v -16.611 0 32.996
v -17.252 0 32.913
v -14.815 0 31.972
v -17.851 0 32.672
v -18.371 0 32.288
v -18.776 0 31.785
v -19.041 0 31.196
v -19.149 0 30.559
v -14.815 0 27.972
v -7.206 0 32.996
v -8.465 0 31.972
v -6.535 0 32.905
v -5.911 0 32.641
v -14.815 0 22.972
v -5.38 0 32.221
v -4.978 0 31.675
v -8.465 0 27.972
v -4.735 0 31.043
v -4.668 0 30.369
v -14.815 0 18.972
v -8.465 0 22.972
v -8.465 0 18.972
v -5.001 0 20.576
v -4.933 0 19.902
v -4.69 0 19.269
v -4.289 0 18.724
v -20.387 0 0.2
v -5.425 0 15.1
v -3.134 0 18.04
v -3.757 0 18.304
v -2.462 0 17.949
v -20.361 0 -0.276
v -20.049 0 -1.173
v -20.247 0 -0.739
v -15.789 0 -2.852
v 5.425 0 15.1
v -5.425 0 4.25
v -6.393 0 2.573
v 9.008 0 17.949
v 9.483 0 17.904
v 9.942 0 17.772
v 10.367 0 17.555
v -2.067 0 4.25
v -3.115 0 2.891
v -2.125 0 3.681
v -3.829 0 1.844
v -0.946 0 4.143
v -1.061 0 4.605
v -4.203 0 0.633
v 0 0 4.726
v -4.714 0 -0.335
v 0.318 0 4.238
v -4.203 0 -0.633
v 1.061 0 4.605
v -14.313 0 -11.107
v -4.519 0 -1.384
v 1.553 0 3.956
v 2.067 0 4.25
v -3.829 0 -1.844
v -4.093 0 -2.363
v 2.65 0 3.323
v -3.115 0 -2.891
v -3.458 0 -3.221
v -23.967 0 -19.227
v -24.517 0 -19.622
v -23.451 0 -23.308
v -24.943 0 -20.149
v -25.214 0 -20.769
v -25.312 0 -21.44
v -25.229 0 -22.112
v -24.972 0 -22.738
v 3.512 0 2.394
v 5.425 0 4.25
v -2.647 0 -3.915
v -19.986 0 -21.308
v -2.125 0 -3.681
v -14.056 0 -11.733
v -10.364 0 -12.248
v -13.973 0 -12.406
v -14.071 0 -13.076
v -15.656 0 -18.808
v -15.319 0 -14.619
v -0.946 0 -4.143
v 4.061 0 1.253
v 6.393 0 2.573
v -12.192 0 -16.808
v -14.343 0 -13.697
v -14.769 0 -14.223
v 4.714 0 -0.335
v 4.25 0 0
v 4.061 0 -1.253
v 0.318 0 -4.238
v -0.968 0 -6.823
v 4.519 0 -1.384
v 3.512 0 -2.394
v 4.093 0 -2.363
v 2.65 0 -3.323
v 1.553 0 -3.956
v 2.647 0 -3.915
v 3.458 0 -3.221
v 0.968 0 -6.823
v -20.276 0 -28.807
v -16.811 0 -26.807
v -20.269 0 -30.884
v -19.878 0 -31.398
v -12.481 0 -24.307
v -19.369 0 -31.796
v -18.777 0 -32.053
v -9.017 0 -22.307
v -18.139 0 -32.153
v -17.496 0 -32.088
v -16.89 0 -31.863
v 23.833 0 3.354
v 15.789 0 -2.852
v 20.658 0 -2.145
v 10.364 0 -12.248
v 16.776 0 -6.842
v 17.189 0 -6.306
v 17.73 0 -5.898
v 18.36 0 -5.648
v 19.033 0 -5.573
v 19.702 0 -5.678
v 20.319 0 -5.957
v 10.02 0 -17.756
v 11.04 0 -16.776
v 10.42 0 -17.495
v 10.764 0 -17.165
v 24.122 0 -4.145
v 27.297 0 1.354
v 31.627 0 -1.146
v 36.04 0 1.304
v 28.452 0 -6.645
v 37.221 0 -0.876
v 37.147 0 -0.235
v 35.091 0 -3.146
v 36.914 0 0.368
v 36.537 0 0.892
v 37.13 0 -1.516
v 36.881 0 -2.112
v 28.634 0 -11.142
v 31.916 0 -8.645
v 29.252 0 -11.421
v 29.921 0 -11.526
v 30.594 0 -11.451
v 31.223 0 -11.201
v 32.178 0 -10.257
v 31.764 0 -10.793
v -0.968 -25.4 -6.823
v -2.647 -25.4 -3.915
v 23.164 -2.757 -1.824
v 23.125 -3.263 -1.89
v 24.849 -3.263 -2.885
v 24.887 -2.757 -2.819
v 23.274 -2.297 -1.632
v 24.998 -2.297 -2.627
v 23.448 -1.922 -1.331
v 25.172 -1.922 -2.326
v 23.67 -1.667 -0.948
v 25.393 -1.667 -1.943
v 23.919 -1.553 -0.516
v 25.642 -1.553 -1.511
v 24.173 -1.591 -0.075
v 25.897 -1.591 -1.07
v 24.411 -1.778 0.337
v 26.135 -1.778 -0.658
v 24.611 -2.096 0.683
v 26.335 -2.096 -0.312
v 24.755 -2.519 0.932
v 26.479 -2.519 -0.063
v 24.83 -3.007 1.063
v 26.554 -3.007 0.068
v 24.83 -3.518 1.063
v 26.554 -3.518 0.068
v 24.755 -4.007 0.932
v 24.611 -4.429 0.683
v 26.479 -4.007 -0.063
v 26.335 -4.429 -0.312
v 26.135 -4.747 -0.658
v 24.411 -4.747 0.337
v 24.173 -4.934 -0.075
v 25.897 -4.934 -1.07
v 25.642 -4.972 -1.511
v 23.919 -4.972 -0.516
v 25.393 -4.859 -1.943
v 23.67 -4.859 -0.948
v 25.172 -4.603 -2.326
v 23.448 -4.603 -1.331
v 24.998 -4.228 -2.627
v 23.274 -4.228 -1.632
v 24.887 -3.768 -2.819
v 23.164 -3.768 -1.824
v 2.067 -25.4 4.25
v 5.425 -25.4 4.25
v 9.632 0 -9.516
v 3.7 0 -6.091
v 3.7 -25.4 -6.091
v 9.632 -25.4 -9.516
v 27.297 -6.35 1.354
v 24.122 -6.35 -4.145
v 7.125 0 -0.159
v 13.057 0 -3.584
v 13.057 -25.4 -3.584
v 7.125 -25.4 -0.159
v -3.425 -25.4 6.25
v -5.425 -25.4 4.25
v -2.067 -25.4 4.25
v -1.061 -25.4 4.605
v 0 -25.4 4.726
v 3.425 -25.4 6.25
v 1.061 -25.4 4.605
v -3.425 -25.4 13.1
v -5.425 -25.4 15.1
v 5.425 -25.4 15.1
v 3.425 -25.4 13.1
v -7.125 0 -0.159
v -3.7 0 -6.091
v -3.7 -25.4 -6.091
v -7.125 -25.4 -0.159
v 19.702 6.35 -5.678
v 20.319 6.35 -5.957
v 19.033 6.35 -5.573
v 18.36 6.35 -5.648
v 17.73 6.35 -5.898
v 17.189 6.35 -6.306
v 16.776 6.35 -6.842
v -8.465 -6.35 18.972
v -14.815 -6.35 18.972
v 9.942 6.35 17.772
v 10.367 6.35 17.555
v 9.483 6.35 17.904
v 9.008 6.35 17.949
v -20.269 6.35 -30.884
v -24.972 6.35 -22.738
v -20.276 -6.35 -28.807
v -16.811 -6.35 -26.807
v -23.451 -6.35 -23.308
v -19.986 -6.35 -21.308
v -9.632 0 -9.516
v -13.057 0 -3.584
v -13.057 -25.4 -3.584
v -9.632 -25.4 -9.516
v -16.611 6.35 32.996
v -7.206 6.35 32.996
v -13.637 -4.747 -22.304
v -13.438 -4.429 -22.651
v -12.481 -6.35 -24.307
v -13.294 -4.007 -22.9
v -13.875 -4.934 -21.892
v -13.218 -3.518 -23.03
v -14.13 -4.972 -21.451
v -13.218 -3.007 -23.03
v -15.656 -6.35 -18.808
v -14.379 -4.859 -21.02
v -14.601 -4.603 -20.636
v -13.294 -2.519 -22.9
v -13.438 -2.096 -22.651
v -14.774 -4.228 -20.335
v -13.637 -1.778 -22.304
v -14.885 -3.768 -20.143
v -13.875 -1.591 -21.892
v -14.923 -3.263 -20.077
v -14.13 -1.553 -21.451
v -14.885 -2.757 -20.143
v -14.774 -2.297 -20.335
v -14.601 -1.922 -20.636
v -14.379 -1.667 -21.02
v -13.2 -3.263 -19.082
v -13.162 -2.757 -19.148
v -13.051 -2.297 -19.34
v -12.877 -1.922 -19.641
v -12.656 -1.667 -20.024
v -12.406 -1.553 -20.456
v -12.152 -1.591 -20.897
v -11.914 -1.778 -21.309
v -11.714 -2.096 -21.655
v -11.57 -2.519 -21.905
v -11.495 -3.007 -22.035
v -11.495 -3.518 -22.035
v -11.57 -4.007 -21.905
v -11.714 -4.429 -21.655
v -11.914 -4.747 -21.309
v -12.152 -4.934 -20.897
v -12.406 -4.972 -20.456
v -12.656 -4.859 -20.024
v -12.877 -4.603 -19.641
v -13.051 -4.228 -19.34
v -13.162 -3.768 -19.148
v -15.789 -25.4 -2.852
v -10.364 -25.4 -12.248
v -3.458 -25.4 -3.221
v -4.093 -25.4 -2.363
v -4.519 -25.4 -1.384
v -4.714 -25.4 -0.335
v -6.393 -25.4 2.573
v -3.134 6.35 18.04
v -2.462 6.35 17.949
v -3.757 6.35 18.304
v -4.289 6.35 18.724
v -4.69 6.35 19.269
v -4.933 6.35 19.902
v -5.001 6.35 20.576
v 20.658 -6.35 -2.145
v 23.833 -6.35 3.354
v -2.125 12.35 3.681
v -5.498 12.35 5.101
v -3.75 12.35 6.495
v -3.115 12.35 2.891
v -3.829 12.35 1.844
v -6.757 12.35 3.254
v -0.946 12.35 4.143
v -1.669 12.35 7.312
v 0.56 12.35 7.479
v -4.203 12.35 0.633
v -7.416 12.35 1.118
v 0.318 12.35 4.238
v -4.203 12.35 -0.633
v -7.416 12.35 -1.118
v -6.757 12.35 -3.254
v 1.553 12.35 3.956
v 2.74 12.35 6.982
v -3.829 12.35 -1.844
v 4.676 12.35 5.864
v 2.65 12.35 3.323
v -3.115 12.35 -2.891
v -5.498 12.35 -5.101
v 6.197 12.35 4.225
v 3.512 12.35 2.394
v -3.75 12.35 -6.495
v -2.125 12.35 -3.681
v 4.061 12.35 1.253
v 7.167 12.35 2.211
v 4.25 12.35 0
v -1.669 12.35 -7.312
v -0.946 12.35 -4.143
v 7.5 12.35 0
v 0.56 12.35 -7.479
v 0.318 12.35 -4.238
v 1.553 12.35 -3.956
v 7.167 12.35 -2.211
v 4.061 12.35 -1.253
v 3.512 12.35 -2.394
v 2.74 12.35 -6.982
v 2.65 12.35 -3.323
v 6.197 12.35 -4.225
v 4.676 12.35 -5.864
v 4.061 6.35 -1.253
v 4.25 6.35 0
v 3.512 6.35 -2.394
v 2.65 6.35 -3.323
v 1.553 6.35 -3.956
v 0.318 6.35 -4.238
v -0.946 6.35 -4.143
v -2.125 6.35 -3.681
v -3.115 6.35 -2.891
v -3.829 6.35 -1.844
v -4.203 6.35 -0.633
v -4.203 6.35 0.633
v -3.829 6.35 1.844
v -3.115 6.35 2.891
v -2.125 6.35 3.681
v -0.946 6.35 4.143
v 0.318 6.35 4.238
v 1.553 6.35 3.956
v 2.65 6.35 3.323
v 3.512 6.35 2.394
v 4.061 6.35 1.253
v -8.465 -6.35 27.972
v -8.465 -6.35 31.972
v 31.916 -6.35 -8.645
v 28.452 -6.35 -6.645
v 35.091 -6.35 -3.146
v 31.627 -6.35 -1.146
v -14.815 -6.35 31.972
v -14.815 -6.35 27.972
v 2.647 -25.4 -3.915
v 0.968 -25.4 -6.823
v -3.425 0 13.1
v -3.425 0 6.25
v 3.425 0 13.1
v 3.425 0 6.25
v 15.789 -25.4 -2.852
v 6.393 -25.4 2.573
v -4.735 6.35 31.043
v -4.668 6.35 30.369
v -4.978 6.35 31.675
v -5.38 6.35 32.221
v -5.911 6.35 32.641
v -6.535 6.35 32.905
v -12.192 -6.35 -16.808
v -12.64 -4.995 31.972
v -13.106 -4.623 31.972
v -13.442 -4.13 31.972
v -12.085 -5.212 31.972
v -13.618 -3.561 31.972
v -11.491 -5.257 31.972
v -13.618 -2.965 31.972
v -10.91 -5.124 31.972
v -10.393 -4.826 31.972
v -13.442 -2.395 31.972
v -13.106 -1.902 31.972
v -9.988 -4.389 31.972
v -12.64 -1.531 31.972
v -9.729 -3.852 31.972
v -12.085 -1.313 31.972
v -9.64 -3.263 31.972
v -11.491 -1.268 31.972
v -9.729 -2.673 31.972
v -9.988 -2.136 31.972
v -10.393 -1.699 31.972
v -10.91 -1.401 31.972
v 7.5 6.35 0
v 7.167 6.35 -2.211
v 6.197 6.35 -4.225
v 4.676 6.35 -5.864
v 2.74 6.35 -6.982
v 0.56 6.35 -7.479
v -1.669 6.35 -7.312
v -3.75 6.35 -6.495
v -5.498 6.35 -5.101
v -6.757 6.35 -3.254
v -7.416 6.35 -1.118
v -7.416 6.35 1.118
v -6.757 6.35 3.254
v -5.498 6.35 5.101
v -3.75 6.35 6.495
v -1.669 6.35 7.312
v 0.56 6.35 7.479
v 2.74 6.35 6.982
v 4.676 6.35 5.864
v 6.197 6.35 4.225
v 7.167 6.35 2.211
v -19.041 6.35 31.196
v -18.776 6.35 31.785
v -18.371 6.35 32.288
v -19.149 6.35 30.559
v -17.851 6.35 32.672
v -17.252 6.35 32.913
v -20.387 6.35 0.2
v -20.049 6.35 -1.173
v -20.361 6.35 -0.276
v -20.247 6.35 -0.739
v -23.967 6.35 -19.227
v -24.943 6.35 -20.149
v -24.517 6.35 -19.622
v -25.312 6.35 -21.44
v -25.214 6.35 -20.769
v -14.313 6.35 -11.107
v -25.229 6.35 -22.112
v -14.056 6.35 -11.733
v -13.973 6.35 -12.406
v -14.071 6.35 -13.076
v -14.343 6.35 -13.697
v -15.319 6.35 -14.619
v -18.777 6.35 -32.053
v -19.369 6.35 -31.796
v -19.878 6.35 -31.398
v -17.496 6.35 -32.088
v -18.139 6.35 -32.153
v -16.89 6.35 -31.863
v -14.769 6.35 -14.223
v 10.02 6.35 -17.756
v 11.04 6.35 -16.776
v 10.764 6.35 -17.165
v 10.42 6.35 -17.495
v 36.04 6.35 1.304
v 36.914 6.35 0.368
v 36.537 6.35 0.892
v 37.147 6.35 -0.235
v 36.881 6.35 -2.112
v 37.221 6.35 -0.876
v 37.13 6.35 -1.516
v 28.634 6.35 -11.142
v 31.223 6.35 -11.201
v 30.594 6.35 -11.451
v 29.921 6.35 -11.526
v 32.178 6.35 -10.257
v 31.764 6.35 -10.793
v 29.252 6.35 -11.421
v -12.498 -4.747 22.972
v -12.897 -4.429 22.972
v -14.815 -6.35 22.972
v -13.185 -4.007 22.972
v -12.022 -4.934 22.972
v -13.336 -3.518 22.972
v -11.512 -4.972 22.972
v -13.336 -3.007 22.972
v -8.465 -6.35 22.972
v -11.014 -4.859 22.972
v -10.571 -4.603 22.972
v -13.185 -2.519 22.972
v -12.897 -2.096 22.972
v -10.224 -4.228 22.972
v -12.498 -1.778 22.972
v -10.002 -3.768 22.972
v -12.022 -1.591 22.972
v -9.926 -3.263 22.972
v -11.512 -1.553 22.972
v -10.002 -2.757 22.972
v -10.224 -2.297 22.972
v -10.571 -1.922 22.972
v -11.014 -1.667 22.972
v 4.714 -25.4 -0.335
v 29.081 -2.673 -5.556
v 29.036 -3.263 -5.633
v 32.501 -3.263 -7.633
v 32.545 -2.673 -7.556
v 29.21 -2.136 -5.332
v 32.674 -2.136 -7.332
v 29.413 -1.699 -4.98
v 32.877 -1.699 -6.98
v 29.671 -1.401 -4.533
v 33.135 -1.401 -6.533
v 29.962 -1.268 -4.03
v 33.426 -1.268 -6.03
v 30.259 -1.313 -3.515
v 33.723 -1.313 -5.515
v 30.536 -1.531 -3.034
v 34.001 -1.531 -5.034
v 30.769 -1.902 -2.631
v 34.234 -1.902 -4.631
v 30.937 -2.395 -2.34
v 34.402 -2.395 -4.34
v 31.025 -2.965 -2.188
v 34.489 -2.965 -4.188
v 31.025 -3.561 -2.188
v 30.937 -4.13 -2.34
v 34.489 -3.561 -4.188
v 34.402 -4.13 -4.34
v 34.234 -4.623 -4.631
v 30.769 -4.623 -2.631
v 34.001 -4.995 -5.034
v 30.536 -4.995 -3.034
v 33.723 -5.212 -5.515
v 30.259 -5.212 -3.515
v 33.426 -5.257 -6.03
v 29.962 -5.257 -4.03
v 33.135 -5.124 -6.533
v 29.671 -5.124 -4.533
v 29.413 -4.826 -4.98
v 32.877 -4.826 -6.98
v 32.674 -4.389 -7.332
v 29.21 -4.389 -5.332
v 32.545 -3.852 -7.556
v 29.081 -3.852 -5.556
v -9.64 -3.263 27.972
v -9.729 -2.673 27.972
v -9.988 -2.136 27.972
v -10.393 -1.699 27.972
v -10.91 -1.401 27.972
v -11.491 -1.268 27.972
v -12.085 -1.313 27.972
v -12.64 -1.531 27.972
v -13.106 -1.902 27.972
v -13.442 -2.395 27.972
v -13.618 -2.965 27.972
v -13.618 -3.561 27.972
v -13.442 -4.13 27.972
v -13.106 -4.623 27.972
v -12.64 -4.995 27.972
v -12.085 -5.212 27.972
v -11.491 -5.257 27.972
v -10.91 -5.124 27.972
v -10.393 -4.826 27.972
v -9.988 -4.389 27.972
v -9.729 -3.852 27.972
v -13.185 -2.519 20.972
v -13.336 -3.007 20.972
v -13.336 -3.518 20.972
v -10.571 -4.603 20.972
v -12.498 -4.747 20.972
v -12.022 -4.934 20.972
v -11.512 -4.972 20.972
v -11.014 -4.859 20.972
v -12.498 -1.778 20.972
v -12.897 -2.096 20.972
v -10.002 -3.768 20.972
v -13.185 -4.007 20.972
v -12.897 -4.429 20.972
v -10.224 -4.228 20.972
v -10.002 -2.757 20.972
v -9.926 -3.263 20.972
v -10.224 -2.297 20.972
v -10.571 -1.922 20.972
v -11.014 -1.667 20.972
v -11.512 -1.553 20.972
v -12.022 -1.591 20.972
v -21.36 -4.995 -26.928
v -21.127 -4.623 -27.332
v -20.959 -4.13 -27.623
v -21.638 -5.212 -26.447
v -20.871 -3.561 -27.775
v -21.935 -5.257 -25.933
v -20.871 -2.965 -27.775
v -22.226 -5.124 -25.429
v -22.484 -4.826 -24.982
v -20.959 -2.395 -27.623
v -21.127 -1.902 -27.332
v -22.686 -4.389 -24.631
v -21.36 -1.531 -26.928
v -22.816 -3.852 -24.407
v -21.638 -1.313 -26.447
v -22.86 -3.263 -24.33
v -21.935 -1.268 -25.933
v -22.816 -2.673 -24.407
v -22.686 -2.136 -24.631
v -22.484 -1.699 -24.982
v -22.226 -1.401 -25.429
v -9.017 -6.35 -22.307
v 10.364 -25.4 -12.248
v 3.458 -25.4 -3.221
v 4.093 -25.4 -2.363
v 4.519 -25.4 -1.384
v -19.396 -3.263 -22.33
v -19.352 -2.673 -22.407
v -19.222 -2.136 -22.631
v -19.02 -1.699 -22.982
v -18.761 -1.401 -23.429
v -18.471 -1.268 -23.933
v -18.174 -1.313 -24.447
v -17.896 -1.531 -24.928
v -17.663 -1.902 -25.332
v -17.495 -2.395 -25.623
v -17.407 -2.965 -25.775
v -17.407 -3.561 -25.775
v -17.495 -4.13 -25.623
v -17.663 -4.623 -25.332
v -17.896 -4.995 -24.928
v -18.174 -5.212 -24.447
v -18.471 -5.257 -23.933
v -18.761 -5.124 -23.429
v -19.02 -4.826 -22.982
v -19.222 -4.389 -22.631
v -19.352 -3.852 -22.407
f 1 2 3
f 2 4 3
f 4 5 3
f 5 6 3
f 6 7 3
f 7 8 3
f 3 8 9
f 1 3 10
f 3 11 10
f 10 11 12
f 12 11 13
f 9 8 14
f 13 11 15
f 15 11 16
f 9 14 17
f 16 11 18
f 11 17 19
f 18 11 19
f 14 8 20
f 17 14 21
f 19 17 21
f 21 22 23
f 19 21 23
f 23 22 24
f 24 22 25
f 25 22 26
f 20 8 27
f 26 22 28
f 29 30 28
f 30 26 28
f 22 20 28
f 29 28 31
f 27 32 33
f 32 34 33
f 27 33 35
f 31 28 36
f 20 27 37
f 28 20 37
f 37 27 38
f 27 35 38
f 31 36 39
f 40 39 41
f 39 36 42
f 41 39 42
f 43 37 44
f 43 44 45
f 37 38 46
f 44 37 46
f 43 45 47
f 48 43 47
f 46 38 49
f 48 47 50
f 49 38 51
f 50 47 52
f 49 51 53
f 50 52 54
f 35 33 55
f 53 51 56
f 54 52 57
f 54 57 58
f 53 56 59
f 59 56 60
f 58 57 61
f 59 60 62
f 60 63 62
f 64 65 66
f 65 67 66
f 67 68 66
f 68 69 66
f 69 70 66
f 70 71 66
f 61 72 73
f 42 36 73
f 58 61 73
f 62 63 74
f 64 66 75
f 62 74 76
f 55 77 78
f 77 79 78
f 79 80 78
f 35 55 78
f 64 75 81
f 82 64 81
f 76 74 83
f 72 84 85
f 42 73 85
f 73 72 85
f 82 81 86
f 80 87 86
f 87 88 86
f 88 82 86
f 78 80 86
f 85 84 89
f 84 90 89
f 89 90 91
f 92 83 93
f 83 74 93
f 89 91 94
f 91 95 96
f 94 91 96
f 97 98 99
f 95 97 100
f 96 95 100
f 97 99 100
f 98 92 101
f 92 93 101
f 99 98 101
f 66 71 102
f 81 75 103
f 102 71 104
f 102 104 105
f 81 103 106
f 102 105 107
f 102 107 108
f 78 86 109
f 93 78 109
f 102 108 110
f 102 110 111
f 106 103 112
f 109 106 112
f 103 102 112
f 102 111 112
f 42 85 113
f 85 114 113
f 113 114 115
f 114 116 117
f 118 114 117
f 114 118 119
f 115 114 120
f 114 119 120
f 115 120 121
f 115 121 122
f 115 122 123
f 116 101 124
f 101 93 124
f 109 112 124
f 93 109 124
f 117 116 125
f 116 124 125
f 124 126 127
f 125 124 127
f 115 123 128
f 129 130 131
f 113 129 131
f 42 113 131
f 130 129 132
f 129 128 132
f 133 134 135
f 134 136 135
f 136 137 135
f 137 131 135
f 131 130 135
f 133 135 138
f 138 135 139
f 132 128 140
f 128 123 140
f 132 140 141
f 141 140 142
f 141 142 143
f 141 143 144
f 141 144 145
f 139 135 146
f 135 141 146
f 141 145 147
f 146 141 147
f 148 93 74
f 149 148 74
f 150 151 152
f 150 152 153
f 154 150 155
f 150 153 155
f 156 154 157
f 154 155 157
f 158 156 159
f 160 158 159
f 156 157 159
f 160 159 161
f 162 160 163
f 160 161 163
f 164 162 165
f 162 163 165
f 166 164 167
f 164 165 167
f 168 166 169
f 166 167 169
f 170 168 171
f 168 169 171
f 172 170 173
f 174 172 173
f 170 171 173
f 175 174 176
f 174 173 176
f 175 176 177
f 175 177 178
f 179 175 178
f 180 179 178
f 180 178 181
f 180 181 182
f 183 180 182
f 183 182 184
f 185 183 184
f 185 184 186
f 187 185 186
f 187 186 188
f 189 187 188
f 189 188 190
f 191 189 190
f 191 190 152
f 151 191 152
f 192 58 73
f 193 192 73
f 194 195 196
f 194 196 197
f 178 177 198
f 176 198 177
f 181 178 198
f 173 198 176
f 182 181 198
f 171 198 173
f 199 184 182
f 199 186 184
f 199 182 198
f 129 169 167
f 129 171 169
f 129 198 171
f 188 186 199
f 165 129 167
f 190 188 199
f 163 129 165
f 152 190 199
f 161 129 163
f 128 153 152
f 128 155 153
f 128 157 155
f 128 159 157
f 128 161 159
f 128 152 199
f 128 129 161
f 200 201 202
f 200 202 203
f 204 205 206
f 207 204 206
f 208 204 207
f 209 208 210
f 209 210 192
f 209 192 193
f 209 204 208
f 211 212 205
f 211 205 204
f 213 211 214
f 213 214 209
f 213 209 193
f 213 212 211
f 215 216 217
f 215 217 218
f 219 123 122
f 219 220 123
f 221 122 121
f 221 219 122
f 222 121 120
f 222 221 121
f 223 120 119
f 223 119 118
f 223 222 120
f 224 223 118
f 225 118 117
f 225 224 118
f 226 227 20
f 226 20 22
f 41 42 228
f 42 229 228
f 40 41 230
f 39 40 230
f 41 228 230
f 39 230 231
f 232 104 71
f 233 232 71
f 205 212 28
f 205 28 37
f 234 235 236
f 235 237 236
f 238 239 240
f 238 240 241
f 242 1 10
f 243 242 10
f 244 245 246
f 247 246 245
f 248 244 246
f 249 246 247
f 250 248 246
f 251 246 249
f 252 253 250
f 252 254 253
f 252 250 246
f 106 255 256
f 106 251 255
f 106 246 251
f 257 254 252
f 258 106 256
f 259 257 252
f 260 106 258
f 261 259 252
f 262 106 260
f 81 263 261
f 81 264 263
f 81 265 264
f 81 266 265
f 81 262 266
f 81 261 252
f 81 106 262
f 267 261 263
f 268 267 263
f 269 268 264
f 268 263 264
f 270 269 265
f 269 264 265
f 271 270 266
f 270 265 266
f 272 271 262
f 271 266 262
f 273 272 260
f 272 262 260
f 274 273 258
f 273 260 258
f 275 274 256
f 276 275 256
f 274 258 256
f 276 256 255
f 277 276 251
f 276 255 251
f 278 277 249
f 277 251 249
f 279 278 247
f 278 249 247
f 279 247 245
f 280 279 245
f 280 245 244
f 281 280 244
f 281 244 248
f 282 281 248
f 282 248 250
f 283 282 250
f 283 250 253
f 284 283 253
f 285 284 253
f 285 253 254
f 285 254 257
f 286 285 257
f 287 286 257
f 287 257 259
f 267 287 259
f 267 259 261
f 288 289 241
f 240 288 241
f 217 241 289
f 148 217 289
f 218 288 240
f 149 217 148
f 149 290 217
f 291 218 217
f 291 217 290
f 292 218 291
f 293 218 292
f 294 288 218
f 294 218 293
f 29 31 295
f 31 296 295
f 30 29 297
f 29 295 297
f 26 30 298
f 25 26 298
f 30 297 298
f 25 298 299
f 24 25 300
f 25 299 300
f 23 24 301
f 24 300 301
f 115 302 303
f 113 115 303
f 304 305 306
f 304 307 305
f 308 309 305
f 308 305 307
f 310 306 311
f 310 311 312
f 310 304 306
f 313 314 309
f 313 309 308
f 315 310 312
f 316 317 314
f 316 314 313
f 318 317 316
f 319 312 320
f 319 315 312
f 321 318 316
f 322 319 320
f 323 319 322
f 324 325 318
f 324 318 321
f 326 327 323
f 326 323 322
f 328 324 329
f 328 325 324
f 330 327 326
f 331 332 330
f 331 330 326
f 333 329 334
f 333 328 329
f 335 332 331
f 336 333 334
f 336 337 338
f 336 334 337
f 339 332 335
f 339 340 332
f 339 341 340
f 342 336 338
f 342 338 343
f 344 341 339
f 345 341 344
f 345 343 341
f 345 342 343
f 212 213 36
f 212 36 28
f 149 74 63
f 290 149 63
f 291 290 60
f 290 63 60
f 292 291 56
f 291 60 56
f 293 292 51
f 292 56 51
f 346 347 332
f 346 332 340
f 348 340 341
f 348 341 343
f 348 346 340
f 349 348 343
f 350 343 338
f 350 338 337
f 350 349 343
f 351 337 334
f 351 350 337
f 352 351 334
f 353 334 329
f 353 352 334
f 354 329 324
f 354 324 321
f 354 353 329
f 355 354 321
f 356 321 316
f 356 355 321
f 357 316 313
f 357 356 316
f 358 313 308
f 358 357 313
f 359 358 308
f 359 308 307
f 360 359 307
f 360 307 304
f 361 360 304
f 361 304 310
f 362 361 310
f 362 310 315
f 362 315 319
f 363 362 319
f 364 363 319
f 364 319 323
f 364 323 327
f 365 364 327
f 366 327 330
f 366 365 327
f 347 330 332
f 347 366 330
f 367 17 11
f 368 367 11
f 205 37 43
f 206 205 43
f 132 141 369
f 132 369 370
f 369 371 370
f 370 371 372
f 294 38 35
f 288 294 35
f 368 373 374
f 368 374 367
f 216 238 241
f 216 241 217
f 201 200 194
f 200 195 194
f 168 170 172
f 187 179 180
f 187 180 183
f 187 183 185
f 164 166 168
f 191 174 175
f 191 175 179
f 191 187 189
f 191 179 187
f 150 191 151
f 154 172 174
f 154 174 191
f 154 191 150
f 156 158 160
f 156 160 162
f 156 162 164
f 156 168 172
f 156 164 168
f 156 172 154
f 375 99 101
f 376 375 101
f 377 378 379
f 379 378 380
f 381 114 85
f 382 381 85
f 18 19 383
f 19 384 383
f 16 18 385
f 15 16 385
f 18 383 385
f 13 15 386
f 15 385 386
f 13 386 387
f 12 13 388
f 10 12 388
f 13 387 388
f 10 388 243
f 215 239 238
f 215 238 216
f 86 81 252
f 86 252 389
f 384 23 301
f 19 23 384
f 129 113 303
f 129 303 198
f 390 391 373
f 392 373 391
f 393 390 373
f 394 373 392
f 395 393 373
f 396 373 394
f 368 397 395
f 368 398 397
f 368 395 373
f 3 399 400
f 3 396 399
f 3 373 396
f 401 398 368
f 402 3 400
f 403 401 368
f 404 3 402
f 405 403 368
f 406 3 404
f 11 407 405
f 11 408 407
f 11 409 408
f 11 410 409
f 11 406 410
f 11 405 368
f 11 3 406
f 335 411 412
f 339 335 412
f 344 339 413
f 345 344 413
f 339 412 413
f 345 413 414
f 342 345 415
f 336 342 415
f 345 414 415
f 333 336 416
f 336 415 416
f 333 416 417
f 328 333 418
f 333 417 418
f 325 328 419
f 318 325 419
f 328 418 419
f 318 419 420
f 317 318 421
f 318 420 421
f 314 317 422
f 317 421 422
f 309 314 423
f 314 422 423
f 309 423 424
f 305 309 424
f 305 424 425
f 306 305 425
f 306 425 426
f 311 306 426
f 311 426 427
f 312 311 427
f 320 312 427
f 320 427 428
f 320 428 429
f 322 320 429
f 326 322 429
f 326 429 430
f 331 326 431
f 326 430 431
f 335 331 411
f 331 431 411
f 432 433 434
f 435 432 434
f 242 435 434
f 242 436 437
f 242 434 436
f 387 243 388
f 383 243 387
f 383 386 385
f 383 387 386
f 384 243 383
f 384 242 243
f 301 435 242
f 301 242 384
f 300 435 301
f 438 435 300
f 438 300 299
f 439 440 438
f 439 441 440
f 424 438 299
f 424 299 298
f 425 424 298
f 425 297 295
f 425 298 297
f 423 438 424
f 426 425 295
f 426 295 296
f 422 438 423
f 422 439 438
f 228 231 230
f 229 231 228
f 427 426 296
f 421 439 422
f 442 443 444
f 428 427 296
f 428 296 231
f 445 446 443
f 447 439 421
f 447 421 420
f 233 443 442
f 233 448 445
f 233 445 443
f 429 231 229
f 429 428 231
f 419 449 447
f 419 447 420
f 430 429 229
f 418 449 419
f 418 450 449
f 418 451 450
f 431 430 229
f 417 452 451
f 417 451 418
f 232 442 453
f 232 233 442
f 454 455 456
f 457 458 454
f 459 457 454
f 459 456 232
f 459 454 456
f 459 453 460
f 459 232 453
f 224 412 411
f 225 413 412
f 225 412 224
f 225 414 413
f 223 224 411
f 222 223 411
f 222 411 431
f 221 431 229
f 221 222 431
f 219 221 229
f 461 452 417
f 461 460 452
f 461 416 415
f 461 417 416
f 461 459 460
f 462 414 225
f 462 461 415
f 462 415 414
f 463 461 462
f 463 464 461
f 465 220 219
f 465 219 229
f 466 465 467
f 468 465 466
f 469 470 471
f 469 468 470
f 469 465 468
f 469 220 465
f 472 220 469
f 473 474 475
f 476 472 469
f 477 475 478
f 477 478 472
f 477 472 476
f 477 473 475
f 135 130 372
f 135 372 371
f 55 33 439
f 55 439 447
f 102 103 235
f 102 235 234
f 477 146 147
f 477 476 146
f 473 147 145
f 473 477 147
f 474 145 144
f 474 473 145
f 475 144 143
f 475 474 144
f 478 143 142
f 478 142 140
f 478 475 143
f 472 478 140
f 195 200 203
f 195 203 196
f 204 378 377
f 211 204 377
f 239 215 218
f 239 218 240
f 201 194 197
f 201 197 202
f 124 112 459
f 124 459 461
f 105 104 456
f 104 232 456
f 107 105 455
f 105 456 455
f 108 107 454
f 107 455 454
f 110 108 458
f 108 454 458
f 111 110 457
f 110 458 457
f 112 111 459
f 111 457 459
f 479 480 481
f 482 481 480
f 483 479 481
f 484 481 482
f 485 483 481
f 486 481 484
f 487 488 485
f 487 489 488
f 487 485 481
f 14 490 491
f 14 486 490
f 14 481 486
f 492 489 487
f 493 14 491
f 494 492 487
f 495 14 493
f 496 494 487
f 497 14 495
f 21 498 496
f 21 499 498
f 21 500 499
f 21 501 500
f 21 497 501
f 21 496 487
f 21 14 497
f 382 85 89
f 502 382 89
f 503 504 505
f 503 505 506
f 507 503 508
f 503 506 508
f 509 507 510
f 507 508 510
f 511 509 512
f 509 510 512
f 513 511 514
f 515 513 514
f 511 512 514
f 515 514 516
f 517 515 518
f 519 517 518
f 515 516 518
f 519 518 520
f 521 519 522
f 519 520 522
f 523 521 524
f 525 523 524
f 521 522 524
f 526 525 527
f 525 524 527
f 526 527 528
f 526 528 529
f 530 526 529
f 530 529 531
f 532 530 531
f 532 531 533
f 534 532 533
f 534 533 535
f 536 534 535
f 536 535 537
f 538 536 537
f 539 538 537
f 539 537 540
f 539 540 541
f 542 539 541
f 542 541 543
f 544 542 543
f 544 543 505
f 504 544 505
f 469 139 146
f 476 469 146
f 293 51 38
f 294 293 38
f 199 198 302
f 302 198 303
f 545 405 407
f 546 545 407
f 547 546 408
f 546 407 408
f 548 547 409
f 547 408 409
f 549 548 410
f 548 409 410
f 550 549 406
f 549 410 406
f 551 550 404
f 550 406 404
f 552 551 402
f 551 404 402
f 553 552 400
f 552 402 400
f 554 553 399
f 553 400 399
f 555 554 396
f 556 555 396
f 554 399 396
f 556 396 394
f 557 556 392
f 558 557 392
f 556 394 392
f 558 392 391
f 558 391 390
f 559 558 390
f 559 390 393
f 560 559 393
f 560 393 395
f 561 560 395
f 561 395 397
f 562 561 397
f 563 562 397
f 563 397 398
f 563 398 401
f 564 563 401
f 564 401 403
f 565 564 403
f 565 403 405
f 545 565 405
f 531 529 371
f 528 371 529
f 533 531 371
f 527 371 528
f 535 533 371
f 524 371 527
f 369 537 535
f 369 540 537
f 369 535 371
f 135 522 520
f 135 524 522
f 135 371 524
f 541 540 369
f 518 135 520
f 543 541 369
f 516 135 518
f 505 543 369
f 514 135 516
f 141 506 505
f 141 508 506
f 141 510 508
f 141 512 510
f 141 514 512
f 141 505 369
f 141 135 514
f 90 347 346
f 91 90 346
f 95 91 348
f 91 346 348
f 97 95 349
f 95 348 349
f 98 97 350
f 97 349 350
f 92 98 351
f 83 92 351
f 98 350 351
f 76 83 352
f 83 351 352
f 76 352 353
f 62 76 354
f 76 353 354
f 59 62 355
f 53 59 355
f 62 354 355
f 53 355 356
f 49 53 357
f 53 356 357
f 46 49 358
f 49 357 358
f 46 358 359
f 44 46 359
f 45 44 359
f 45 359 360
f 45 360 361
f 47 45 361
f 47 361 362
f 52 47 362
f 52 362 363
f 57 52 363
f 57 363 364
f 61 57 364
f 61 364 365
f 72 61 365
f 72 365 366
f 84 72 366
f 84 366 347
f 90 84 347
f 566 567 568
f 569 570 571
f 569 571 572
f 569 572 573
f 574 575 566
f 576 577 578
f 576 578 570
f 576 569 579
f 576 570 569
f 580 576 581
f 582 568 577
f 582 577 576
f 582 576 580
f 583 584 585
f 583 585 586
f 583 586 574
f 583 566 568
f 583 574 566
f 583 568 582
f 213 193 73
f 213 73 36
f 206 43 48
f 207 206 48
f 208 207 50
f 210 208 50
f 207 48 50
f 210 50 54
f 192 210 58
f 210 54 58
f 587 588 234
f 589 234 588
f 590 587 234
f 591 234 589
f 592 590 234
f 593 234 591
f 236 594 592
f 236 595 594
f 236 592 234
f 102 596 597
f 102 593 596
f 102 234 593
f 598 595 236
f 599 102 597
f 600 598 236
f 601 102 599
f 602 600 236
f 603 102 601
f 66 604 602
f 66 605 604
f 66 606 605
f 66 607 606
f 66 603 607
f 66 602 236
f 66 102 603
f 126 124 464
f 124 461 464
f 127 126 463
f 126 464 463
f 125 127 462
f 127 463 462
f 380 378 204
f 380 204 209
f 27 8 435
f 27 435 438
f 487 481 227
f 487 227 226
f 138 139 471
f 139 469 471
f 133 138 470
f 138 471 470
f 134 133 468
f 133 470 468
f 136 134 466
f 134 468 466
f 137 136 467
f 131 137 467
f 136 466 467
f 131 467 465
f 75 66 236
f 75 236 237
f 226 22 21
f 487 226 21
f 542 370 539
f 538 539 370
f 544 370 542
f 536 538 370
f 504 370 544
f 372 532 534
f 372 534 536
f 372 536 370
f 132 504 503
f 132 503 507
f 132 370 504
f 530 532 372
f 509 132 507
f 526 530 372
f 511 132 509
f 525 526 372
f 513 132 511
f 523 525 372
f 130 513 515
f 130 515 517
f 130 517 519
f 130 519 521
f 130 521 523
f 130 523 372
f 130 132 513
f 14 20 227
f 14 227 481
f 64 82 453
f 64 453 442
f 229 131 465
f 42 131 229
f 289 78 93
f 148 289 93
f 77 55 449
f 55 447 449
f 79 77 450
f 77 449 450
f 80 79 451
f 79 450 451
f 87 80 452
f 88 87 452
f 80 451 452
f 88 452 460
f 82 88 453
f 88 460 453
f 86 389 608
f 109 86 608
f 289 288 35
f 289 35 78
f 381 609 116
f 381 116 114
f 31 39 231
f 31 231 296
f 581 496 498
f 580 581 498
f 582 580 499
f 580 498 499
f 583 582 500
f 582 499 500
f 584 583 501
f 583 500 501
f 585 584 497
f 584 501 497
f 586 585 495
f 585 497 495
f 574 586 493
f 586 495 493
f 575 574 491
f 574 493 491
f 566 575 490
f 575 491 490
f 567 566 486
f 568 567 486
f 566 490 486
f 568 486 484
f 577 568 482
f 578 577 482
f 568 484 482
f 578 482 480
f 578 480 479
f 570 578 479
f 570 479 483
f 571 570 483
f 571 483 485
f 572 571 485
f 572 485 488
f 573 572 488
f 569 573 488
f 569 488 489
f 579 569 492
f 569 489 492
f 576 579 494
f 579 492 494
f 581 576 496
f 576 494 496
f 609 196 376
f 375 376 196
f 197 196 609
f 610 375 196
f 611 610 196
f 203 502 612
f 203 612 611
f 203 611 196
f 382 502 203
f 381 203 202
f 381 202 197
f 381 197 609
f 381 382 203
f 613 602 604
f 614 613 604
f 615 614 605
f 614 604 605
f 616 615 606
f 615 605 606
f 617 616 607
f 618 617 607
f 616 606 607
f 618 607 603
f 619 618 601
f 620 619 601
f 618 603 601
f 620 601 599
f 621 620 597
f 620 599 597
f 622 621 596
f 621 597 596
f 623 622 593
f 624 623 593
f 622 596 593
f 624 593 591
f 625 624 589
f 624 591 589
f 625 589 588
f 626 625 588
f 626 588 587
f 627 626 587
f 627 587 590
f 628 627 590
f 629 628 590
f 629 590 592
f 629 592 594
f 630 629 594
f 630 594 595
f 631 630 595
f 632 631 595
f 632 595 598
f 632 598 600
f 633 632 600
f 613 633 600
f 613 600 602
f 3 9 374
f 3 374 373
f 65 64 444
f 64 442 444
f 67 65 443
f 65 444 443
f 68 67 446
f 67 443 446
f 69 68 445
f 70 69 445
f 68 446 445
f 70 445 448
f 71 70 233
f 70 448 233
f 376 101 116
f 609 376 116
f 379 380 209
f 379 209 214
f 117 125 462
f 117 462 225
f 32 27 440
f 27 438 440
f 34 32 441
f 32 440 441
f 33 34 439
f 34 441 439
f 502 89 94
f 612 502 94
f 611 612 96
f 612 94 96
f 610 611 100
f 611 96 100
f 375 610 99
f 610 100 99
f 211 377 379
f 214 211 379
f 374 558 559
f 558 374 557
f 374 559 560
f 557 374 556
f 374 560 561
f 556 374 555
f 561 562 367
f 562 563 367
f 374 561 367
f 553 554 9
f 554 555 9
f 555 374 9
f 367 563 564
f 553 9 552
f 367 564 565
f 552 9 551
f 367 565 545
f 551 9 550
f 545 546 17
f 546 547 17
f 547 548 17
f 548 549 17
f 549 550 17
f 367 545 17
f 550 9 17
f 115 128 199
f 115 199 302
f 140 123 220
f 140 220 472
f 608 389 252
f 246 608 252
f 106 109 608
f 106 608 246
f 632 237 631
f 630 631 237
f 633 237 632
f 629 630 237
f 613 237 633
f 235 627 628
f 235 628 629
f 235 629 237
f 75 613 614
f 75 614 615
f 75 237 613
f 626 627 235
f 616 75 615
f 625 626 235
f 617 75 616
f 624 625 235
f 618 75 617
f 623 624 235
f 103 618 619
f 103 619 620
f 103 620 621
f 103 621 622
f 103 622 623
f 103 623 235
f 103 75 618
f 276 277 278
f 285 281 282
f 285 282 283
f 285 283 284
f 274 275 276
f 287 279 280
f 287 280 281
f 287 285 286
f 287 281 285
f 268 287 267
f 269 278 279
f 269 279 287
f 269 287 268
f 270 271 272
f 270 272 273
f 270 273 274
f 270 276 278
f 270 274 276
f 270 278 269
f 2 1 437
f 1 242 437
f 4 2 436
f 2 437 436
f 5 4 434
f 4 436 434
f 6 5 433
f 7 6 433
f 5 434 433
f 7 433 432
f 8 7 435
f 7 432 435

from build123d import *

# Parameters (mm, degrees)
BOSS_EXTRUDE1_DEPTH = 6.35
SKETCH6_R           = 4.250000001
CUT_EXTRUDE1_DEPTH  = 7.35
SKETCH2_W           = 6.85
SKETCH2_H           = 6.85
BOSS_EXTRUDE2_DEPTH = 25.4
SKETCH7_W           = 6.35
SKETCH7_H           = 4
BOSS_EXTRUDE3_DEPTH = 6.35
SKETCH9_R           = 2
CUT_EXTRUDE2_DEPTH  = 6.540000128
CIRPATTERN1_COUNT   = 3
SKETCH10_R          = 1.7145
CUT_EXTRUDE3_DEPTH  = 2
CIRPATTERN2_COUNT   = 3
CUT_EXTRUDE4_DEPTH  = 6.35
FILLET1_R           = 2.54
SKETCH12_R          = 7.5
SKETCH12_R_2        = 4.250000001
BOSS_EXTRUDE4_DEPTH = 6


with BuildPart() as part:
    # Sketch1 → Boss-Extrude1 (new body)
    with BuildSketch(Plane(origin=(0, 0, 0), x_dir=(1, 0, 0), z_dir=(0, 1, 0))):
        Polygon((19.05, -32.995567884), (38.1, 0), (19.05, 32.995567884), (-19.05, 32.995567884), (-38.1, 0), (-19.05, -32.995567884), align=None)
    extrude(amount=BOSS_EXTRUDE1_DEPTH)

    # Sketch6 → Cut-Extrude1 (cut, through all)
    with BuildSketch(Plane(origin=(0, 6.35, 0), x_dir=(1, 0, 0), z_dir=(0, 1, 0))):
        Circle(SKETCH6_R)
    extrude(amount=-CUT_EXTRUDE1_DEPTH, mode=Mode.SUBTRACT)

    # Sketch2 → Boss-Extrude2 (add)
    with BuildSketch(Plane.XZ):
        with BuildLine():
            Line((-5.425, 15.1), (-5.425, 4.25))
            Line((-5.425, 4.25), (-2.067021045, 4.25))
            ThreePointArc((-2.067021045, 4.25), (0, 4.726), (2.067021045, 4.25))
            Line((2.067021045, 4.25), (5.425, 4.25))
            Line((5.425, 4.25), (5.425, 15.1))
            Line((5.425, 15.1), (-5.425, 15.1))
        make_face()
        with Locations((0, 9.675)):
            Rectangle(SKETCH2_W, SKETCH2_H, mode=Mode.SUBTRACT)
        with BuildLine():
            Line((2.647097444, -3.915092735), (0.968107966, -6.823187816))
            Line((0.968107966, -6.823187816), (10.364483597, -12.248187816))
            Line((10.364483597, -12.248187816), (15.789483597, -2.851812184))
            Line((15.789483597, -2.851812184), (6.393107966, 2.573187816))
            Line((6.393107966, 2.573187816), (4.714118489, -0.334907265))
            ThreePointArc((4.714118489, -0.334907265), (4.092836058, -2.363), (2.647097444, -3.915092735))
        make_face()
        Polygon((13.05743279, -3.583862992), (7.125158774, -0.158862992), (3.700158774, -6.091137008), (9.63243279, -9.516137008), align=None, mode=Mode.SUBTRACT)
        with BuildLine():
            Line((-4.714118489, -0.334907265), (-6.393107966, 2.573187816))
            Line((-6.393107966, 2.573187816), (-15.789483597, -2.851812184))
            Line((-15.789483597, -2.851812184), (-10.364483597, -12.248187816))
            Line((-10.364483597, -12.248187816), (-0.968107966, -6.823187816))
            Line((-0.968107966, -6.823187816), (-2.647097444, -3.915092735))
            ThreePointArc((-2.647097444, -3.915092735), (-4.092836058, -2.363), (-4.714118489, -0.334907265))
        make_face()
        Polygon((-9.63243279, -9.516137008), (-3.700158774, -6.091137008), (-7.125158774, -0.158862992), (-13.05743279, -3.583862992), align=None, mode=Mode.SUBTRACT)
    extrude(amount=BOSS_EXTRUDE2_DEPTH)

    # Sketch7 → Boss-Extrude3 (add)
    with BuildSketch(Plane.XZ):
        with Locations((-11.640300372, 20.97230006)):
            Rectangle(SKETCH7_W, SKETCH7_H)
        with Locations((-11.640300372, 29.97230006)):
            Rectangle(SKETCH7_W, SKETCH7_H)
        Polygon((27.296626747, 1.354008633), (24.121626747, -4.145252681), (20.657525132, -2.145252681), (23.832525132, 3.354008633), align=None)
        Polygon((31.626753766, -1.145991367), (35.090855381, -3.145991367), (31.915855381, -8.645252681), (28.451753766, -6.645252681), align=None)
        Polygon((-12.481326375, -24.306844341), (-15.656326375, -18.807583027), (-12.19222476, -16.807583027), (-9.01722476, -22.306844341), align=None)
        Polygon((-16.811453394, -26.806844341), (-20.275555009, -28.806844341), (-23.450555009, -23.307583027), (-19.986453394, -21.307583027), align=None)
    extrude(amount=BOSS_EXTRUDE3_DEPTH)

    # Sketch9 → Cut-Extrude2 (cut)
    with BuildSketch(Plane.XY.offset(31.97230006)):
        with Locations((-11.640300372, -3.262620176)):
            Circle(SKETCH9_R)
    cut_extrude2 = extrude(amount=-CUT_EXTRUDE2_DEPTH, mode=Mode.SUBTRACT)

    # CirPattern1: Cut-Extrude2 ×3 about axis
    cirpattern1_axis = Axis((0, 0, 0), (0, 1, 0))
    for i in range(1, CIRPATTERN1_COUNT):
        add(cut_extrude2.rotate(cirpattern1_axis, i * 360 / CIRPATTERN1_COUNT), mode=Mode.SUBTRACT)

    # Sketch10 → Cut-Extrude3 (cut)
    with BuildSketch(Plane.XY.offset(22.97230006)):
        with Locations((-11.640300372, -3.262620176)):
            Circle(SKETCH10_R)
    cut_extrude3 = extrude(amount=-CUT_EXTRUDE3_DEPTH, mode=Mode.SUBTRACT)

    # CirPattern2: Cut-Extrude3 ×3 about axis
    cirpattern2_axis = Axis((0, 0, 0), (0, 1, 0))
    for i in range(1, CIRPATTERN2_COUNT):
        add(cut_extrude3.rotate(cirpattern2_axis, i * 360 / CIRPATTERN2_COUNT), mode=Mode.SUBTRACT)

    # Sketch11 → Cut-Extrude4 (cut)
    with BuildSketch(Plane.XZ):
        Polygon((-38.1, 0), (-19.05, 32.995567884), (-20.416871812, -0.535432071), (-12.999443709, -13.382794406), (-26.285912957, -20.462599003), align=None)
        Polygon((19.05, 32.995567884), (38.1, 0), (9.74473813, 17.94924569), (-5.090118075, 17.94924569), (-4.578174086, 32.995567884), align=None)
        Polygon((19.05, -32.995567884), (-19.05, -32.995567884), (10.672133681, -17.413813619), (18.089561784, -4.566451284), (30.864087043, -12.532968881), align=None)
    extrude(amount=-CUT_EXTRUDE4_DEPTH, mode=Mode.SUBTRACT)

    # Fillet1
    fillet1_edges = [part.edges().sort_by_distance(p)[0] for p in [
        (38.1, 3.175, 0),
        (-19.05, 3.175, 32.995567884),
        (-19.05, 3.175, -32.995567884),
        (18.089561784, 3.175, -4.566451284),
        (10.672133681, 3.175, -17.413813619),
        (30.864087043, 3.175, -12.532968881),
        (-5.090118075, 3.175, 17.94924569),
        (9.74473813, 3.175, 17.94924569),
        (-4.578174086, 3.175, 32.995567884),
        (-12.999443709, 3.175, -13.382794406),
        (-20.416871812, 3.175, -0.535432071),
        (-26.285912957, 3.175, -20.462599003),
    ]]
    fillet(fillet1_edges, radius=FILLET1_R)

    # Sketch12 → Boss-Extrude4 (add)
    with BuildSketch(Plane(origin=(0, 6.35, 0), x_dir=(1, 0, 0), z_dir=(0, 1, 0))):
        Circle(SKETCH12_R)
        Circle(SKETCH12_R_2, mode=Mode.SUBTRACT)
    extrude(amount=BOSS_EXTRUDE4_DEPTH)


solid = part.part
